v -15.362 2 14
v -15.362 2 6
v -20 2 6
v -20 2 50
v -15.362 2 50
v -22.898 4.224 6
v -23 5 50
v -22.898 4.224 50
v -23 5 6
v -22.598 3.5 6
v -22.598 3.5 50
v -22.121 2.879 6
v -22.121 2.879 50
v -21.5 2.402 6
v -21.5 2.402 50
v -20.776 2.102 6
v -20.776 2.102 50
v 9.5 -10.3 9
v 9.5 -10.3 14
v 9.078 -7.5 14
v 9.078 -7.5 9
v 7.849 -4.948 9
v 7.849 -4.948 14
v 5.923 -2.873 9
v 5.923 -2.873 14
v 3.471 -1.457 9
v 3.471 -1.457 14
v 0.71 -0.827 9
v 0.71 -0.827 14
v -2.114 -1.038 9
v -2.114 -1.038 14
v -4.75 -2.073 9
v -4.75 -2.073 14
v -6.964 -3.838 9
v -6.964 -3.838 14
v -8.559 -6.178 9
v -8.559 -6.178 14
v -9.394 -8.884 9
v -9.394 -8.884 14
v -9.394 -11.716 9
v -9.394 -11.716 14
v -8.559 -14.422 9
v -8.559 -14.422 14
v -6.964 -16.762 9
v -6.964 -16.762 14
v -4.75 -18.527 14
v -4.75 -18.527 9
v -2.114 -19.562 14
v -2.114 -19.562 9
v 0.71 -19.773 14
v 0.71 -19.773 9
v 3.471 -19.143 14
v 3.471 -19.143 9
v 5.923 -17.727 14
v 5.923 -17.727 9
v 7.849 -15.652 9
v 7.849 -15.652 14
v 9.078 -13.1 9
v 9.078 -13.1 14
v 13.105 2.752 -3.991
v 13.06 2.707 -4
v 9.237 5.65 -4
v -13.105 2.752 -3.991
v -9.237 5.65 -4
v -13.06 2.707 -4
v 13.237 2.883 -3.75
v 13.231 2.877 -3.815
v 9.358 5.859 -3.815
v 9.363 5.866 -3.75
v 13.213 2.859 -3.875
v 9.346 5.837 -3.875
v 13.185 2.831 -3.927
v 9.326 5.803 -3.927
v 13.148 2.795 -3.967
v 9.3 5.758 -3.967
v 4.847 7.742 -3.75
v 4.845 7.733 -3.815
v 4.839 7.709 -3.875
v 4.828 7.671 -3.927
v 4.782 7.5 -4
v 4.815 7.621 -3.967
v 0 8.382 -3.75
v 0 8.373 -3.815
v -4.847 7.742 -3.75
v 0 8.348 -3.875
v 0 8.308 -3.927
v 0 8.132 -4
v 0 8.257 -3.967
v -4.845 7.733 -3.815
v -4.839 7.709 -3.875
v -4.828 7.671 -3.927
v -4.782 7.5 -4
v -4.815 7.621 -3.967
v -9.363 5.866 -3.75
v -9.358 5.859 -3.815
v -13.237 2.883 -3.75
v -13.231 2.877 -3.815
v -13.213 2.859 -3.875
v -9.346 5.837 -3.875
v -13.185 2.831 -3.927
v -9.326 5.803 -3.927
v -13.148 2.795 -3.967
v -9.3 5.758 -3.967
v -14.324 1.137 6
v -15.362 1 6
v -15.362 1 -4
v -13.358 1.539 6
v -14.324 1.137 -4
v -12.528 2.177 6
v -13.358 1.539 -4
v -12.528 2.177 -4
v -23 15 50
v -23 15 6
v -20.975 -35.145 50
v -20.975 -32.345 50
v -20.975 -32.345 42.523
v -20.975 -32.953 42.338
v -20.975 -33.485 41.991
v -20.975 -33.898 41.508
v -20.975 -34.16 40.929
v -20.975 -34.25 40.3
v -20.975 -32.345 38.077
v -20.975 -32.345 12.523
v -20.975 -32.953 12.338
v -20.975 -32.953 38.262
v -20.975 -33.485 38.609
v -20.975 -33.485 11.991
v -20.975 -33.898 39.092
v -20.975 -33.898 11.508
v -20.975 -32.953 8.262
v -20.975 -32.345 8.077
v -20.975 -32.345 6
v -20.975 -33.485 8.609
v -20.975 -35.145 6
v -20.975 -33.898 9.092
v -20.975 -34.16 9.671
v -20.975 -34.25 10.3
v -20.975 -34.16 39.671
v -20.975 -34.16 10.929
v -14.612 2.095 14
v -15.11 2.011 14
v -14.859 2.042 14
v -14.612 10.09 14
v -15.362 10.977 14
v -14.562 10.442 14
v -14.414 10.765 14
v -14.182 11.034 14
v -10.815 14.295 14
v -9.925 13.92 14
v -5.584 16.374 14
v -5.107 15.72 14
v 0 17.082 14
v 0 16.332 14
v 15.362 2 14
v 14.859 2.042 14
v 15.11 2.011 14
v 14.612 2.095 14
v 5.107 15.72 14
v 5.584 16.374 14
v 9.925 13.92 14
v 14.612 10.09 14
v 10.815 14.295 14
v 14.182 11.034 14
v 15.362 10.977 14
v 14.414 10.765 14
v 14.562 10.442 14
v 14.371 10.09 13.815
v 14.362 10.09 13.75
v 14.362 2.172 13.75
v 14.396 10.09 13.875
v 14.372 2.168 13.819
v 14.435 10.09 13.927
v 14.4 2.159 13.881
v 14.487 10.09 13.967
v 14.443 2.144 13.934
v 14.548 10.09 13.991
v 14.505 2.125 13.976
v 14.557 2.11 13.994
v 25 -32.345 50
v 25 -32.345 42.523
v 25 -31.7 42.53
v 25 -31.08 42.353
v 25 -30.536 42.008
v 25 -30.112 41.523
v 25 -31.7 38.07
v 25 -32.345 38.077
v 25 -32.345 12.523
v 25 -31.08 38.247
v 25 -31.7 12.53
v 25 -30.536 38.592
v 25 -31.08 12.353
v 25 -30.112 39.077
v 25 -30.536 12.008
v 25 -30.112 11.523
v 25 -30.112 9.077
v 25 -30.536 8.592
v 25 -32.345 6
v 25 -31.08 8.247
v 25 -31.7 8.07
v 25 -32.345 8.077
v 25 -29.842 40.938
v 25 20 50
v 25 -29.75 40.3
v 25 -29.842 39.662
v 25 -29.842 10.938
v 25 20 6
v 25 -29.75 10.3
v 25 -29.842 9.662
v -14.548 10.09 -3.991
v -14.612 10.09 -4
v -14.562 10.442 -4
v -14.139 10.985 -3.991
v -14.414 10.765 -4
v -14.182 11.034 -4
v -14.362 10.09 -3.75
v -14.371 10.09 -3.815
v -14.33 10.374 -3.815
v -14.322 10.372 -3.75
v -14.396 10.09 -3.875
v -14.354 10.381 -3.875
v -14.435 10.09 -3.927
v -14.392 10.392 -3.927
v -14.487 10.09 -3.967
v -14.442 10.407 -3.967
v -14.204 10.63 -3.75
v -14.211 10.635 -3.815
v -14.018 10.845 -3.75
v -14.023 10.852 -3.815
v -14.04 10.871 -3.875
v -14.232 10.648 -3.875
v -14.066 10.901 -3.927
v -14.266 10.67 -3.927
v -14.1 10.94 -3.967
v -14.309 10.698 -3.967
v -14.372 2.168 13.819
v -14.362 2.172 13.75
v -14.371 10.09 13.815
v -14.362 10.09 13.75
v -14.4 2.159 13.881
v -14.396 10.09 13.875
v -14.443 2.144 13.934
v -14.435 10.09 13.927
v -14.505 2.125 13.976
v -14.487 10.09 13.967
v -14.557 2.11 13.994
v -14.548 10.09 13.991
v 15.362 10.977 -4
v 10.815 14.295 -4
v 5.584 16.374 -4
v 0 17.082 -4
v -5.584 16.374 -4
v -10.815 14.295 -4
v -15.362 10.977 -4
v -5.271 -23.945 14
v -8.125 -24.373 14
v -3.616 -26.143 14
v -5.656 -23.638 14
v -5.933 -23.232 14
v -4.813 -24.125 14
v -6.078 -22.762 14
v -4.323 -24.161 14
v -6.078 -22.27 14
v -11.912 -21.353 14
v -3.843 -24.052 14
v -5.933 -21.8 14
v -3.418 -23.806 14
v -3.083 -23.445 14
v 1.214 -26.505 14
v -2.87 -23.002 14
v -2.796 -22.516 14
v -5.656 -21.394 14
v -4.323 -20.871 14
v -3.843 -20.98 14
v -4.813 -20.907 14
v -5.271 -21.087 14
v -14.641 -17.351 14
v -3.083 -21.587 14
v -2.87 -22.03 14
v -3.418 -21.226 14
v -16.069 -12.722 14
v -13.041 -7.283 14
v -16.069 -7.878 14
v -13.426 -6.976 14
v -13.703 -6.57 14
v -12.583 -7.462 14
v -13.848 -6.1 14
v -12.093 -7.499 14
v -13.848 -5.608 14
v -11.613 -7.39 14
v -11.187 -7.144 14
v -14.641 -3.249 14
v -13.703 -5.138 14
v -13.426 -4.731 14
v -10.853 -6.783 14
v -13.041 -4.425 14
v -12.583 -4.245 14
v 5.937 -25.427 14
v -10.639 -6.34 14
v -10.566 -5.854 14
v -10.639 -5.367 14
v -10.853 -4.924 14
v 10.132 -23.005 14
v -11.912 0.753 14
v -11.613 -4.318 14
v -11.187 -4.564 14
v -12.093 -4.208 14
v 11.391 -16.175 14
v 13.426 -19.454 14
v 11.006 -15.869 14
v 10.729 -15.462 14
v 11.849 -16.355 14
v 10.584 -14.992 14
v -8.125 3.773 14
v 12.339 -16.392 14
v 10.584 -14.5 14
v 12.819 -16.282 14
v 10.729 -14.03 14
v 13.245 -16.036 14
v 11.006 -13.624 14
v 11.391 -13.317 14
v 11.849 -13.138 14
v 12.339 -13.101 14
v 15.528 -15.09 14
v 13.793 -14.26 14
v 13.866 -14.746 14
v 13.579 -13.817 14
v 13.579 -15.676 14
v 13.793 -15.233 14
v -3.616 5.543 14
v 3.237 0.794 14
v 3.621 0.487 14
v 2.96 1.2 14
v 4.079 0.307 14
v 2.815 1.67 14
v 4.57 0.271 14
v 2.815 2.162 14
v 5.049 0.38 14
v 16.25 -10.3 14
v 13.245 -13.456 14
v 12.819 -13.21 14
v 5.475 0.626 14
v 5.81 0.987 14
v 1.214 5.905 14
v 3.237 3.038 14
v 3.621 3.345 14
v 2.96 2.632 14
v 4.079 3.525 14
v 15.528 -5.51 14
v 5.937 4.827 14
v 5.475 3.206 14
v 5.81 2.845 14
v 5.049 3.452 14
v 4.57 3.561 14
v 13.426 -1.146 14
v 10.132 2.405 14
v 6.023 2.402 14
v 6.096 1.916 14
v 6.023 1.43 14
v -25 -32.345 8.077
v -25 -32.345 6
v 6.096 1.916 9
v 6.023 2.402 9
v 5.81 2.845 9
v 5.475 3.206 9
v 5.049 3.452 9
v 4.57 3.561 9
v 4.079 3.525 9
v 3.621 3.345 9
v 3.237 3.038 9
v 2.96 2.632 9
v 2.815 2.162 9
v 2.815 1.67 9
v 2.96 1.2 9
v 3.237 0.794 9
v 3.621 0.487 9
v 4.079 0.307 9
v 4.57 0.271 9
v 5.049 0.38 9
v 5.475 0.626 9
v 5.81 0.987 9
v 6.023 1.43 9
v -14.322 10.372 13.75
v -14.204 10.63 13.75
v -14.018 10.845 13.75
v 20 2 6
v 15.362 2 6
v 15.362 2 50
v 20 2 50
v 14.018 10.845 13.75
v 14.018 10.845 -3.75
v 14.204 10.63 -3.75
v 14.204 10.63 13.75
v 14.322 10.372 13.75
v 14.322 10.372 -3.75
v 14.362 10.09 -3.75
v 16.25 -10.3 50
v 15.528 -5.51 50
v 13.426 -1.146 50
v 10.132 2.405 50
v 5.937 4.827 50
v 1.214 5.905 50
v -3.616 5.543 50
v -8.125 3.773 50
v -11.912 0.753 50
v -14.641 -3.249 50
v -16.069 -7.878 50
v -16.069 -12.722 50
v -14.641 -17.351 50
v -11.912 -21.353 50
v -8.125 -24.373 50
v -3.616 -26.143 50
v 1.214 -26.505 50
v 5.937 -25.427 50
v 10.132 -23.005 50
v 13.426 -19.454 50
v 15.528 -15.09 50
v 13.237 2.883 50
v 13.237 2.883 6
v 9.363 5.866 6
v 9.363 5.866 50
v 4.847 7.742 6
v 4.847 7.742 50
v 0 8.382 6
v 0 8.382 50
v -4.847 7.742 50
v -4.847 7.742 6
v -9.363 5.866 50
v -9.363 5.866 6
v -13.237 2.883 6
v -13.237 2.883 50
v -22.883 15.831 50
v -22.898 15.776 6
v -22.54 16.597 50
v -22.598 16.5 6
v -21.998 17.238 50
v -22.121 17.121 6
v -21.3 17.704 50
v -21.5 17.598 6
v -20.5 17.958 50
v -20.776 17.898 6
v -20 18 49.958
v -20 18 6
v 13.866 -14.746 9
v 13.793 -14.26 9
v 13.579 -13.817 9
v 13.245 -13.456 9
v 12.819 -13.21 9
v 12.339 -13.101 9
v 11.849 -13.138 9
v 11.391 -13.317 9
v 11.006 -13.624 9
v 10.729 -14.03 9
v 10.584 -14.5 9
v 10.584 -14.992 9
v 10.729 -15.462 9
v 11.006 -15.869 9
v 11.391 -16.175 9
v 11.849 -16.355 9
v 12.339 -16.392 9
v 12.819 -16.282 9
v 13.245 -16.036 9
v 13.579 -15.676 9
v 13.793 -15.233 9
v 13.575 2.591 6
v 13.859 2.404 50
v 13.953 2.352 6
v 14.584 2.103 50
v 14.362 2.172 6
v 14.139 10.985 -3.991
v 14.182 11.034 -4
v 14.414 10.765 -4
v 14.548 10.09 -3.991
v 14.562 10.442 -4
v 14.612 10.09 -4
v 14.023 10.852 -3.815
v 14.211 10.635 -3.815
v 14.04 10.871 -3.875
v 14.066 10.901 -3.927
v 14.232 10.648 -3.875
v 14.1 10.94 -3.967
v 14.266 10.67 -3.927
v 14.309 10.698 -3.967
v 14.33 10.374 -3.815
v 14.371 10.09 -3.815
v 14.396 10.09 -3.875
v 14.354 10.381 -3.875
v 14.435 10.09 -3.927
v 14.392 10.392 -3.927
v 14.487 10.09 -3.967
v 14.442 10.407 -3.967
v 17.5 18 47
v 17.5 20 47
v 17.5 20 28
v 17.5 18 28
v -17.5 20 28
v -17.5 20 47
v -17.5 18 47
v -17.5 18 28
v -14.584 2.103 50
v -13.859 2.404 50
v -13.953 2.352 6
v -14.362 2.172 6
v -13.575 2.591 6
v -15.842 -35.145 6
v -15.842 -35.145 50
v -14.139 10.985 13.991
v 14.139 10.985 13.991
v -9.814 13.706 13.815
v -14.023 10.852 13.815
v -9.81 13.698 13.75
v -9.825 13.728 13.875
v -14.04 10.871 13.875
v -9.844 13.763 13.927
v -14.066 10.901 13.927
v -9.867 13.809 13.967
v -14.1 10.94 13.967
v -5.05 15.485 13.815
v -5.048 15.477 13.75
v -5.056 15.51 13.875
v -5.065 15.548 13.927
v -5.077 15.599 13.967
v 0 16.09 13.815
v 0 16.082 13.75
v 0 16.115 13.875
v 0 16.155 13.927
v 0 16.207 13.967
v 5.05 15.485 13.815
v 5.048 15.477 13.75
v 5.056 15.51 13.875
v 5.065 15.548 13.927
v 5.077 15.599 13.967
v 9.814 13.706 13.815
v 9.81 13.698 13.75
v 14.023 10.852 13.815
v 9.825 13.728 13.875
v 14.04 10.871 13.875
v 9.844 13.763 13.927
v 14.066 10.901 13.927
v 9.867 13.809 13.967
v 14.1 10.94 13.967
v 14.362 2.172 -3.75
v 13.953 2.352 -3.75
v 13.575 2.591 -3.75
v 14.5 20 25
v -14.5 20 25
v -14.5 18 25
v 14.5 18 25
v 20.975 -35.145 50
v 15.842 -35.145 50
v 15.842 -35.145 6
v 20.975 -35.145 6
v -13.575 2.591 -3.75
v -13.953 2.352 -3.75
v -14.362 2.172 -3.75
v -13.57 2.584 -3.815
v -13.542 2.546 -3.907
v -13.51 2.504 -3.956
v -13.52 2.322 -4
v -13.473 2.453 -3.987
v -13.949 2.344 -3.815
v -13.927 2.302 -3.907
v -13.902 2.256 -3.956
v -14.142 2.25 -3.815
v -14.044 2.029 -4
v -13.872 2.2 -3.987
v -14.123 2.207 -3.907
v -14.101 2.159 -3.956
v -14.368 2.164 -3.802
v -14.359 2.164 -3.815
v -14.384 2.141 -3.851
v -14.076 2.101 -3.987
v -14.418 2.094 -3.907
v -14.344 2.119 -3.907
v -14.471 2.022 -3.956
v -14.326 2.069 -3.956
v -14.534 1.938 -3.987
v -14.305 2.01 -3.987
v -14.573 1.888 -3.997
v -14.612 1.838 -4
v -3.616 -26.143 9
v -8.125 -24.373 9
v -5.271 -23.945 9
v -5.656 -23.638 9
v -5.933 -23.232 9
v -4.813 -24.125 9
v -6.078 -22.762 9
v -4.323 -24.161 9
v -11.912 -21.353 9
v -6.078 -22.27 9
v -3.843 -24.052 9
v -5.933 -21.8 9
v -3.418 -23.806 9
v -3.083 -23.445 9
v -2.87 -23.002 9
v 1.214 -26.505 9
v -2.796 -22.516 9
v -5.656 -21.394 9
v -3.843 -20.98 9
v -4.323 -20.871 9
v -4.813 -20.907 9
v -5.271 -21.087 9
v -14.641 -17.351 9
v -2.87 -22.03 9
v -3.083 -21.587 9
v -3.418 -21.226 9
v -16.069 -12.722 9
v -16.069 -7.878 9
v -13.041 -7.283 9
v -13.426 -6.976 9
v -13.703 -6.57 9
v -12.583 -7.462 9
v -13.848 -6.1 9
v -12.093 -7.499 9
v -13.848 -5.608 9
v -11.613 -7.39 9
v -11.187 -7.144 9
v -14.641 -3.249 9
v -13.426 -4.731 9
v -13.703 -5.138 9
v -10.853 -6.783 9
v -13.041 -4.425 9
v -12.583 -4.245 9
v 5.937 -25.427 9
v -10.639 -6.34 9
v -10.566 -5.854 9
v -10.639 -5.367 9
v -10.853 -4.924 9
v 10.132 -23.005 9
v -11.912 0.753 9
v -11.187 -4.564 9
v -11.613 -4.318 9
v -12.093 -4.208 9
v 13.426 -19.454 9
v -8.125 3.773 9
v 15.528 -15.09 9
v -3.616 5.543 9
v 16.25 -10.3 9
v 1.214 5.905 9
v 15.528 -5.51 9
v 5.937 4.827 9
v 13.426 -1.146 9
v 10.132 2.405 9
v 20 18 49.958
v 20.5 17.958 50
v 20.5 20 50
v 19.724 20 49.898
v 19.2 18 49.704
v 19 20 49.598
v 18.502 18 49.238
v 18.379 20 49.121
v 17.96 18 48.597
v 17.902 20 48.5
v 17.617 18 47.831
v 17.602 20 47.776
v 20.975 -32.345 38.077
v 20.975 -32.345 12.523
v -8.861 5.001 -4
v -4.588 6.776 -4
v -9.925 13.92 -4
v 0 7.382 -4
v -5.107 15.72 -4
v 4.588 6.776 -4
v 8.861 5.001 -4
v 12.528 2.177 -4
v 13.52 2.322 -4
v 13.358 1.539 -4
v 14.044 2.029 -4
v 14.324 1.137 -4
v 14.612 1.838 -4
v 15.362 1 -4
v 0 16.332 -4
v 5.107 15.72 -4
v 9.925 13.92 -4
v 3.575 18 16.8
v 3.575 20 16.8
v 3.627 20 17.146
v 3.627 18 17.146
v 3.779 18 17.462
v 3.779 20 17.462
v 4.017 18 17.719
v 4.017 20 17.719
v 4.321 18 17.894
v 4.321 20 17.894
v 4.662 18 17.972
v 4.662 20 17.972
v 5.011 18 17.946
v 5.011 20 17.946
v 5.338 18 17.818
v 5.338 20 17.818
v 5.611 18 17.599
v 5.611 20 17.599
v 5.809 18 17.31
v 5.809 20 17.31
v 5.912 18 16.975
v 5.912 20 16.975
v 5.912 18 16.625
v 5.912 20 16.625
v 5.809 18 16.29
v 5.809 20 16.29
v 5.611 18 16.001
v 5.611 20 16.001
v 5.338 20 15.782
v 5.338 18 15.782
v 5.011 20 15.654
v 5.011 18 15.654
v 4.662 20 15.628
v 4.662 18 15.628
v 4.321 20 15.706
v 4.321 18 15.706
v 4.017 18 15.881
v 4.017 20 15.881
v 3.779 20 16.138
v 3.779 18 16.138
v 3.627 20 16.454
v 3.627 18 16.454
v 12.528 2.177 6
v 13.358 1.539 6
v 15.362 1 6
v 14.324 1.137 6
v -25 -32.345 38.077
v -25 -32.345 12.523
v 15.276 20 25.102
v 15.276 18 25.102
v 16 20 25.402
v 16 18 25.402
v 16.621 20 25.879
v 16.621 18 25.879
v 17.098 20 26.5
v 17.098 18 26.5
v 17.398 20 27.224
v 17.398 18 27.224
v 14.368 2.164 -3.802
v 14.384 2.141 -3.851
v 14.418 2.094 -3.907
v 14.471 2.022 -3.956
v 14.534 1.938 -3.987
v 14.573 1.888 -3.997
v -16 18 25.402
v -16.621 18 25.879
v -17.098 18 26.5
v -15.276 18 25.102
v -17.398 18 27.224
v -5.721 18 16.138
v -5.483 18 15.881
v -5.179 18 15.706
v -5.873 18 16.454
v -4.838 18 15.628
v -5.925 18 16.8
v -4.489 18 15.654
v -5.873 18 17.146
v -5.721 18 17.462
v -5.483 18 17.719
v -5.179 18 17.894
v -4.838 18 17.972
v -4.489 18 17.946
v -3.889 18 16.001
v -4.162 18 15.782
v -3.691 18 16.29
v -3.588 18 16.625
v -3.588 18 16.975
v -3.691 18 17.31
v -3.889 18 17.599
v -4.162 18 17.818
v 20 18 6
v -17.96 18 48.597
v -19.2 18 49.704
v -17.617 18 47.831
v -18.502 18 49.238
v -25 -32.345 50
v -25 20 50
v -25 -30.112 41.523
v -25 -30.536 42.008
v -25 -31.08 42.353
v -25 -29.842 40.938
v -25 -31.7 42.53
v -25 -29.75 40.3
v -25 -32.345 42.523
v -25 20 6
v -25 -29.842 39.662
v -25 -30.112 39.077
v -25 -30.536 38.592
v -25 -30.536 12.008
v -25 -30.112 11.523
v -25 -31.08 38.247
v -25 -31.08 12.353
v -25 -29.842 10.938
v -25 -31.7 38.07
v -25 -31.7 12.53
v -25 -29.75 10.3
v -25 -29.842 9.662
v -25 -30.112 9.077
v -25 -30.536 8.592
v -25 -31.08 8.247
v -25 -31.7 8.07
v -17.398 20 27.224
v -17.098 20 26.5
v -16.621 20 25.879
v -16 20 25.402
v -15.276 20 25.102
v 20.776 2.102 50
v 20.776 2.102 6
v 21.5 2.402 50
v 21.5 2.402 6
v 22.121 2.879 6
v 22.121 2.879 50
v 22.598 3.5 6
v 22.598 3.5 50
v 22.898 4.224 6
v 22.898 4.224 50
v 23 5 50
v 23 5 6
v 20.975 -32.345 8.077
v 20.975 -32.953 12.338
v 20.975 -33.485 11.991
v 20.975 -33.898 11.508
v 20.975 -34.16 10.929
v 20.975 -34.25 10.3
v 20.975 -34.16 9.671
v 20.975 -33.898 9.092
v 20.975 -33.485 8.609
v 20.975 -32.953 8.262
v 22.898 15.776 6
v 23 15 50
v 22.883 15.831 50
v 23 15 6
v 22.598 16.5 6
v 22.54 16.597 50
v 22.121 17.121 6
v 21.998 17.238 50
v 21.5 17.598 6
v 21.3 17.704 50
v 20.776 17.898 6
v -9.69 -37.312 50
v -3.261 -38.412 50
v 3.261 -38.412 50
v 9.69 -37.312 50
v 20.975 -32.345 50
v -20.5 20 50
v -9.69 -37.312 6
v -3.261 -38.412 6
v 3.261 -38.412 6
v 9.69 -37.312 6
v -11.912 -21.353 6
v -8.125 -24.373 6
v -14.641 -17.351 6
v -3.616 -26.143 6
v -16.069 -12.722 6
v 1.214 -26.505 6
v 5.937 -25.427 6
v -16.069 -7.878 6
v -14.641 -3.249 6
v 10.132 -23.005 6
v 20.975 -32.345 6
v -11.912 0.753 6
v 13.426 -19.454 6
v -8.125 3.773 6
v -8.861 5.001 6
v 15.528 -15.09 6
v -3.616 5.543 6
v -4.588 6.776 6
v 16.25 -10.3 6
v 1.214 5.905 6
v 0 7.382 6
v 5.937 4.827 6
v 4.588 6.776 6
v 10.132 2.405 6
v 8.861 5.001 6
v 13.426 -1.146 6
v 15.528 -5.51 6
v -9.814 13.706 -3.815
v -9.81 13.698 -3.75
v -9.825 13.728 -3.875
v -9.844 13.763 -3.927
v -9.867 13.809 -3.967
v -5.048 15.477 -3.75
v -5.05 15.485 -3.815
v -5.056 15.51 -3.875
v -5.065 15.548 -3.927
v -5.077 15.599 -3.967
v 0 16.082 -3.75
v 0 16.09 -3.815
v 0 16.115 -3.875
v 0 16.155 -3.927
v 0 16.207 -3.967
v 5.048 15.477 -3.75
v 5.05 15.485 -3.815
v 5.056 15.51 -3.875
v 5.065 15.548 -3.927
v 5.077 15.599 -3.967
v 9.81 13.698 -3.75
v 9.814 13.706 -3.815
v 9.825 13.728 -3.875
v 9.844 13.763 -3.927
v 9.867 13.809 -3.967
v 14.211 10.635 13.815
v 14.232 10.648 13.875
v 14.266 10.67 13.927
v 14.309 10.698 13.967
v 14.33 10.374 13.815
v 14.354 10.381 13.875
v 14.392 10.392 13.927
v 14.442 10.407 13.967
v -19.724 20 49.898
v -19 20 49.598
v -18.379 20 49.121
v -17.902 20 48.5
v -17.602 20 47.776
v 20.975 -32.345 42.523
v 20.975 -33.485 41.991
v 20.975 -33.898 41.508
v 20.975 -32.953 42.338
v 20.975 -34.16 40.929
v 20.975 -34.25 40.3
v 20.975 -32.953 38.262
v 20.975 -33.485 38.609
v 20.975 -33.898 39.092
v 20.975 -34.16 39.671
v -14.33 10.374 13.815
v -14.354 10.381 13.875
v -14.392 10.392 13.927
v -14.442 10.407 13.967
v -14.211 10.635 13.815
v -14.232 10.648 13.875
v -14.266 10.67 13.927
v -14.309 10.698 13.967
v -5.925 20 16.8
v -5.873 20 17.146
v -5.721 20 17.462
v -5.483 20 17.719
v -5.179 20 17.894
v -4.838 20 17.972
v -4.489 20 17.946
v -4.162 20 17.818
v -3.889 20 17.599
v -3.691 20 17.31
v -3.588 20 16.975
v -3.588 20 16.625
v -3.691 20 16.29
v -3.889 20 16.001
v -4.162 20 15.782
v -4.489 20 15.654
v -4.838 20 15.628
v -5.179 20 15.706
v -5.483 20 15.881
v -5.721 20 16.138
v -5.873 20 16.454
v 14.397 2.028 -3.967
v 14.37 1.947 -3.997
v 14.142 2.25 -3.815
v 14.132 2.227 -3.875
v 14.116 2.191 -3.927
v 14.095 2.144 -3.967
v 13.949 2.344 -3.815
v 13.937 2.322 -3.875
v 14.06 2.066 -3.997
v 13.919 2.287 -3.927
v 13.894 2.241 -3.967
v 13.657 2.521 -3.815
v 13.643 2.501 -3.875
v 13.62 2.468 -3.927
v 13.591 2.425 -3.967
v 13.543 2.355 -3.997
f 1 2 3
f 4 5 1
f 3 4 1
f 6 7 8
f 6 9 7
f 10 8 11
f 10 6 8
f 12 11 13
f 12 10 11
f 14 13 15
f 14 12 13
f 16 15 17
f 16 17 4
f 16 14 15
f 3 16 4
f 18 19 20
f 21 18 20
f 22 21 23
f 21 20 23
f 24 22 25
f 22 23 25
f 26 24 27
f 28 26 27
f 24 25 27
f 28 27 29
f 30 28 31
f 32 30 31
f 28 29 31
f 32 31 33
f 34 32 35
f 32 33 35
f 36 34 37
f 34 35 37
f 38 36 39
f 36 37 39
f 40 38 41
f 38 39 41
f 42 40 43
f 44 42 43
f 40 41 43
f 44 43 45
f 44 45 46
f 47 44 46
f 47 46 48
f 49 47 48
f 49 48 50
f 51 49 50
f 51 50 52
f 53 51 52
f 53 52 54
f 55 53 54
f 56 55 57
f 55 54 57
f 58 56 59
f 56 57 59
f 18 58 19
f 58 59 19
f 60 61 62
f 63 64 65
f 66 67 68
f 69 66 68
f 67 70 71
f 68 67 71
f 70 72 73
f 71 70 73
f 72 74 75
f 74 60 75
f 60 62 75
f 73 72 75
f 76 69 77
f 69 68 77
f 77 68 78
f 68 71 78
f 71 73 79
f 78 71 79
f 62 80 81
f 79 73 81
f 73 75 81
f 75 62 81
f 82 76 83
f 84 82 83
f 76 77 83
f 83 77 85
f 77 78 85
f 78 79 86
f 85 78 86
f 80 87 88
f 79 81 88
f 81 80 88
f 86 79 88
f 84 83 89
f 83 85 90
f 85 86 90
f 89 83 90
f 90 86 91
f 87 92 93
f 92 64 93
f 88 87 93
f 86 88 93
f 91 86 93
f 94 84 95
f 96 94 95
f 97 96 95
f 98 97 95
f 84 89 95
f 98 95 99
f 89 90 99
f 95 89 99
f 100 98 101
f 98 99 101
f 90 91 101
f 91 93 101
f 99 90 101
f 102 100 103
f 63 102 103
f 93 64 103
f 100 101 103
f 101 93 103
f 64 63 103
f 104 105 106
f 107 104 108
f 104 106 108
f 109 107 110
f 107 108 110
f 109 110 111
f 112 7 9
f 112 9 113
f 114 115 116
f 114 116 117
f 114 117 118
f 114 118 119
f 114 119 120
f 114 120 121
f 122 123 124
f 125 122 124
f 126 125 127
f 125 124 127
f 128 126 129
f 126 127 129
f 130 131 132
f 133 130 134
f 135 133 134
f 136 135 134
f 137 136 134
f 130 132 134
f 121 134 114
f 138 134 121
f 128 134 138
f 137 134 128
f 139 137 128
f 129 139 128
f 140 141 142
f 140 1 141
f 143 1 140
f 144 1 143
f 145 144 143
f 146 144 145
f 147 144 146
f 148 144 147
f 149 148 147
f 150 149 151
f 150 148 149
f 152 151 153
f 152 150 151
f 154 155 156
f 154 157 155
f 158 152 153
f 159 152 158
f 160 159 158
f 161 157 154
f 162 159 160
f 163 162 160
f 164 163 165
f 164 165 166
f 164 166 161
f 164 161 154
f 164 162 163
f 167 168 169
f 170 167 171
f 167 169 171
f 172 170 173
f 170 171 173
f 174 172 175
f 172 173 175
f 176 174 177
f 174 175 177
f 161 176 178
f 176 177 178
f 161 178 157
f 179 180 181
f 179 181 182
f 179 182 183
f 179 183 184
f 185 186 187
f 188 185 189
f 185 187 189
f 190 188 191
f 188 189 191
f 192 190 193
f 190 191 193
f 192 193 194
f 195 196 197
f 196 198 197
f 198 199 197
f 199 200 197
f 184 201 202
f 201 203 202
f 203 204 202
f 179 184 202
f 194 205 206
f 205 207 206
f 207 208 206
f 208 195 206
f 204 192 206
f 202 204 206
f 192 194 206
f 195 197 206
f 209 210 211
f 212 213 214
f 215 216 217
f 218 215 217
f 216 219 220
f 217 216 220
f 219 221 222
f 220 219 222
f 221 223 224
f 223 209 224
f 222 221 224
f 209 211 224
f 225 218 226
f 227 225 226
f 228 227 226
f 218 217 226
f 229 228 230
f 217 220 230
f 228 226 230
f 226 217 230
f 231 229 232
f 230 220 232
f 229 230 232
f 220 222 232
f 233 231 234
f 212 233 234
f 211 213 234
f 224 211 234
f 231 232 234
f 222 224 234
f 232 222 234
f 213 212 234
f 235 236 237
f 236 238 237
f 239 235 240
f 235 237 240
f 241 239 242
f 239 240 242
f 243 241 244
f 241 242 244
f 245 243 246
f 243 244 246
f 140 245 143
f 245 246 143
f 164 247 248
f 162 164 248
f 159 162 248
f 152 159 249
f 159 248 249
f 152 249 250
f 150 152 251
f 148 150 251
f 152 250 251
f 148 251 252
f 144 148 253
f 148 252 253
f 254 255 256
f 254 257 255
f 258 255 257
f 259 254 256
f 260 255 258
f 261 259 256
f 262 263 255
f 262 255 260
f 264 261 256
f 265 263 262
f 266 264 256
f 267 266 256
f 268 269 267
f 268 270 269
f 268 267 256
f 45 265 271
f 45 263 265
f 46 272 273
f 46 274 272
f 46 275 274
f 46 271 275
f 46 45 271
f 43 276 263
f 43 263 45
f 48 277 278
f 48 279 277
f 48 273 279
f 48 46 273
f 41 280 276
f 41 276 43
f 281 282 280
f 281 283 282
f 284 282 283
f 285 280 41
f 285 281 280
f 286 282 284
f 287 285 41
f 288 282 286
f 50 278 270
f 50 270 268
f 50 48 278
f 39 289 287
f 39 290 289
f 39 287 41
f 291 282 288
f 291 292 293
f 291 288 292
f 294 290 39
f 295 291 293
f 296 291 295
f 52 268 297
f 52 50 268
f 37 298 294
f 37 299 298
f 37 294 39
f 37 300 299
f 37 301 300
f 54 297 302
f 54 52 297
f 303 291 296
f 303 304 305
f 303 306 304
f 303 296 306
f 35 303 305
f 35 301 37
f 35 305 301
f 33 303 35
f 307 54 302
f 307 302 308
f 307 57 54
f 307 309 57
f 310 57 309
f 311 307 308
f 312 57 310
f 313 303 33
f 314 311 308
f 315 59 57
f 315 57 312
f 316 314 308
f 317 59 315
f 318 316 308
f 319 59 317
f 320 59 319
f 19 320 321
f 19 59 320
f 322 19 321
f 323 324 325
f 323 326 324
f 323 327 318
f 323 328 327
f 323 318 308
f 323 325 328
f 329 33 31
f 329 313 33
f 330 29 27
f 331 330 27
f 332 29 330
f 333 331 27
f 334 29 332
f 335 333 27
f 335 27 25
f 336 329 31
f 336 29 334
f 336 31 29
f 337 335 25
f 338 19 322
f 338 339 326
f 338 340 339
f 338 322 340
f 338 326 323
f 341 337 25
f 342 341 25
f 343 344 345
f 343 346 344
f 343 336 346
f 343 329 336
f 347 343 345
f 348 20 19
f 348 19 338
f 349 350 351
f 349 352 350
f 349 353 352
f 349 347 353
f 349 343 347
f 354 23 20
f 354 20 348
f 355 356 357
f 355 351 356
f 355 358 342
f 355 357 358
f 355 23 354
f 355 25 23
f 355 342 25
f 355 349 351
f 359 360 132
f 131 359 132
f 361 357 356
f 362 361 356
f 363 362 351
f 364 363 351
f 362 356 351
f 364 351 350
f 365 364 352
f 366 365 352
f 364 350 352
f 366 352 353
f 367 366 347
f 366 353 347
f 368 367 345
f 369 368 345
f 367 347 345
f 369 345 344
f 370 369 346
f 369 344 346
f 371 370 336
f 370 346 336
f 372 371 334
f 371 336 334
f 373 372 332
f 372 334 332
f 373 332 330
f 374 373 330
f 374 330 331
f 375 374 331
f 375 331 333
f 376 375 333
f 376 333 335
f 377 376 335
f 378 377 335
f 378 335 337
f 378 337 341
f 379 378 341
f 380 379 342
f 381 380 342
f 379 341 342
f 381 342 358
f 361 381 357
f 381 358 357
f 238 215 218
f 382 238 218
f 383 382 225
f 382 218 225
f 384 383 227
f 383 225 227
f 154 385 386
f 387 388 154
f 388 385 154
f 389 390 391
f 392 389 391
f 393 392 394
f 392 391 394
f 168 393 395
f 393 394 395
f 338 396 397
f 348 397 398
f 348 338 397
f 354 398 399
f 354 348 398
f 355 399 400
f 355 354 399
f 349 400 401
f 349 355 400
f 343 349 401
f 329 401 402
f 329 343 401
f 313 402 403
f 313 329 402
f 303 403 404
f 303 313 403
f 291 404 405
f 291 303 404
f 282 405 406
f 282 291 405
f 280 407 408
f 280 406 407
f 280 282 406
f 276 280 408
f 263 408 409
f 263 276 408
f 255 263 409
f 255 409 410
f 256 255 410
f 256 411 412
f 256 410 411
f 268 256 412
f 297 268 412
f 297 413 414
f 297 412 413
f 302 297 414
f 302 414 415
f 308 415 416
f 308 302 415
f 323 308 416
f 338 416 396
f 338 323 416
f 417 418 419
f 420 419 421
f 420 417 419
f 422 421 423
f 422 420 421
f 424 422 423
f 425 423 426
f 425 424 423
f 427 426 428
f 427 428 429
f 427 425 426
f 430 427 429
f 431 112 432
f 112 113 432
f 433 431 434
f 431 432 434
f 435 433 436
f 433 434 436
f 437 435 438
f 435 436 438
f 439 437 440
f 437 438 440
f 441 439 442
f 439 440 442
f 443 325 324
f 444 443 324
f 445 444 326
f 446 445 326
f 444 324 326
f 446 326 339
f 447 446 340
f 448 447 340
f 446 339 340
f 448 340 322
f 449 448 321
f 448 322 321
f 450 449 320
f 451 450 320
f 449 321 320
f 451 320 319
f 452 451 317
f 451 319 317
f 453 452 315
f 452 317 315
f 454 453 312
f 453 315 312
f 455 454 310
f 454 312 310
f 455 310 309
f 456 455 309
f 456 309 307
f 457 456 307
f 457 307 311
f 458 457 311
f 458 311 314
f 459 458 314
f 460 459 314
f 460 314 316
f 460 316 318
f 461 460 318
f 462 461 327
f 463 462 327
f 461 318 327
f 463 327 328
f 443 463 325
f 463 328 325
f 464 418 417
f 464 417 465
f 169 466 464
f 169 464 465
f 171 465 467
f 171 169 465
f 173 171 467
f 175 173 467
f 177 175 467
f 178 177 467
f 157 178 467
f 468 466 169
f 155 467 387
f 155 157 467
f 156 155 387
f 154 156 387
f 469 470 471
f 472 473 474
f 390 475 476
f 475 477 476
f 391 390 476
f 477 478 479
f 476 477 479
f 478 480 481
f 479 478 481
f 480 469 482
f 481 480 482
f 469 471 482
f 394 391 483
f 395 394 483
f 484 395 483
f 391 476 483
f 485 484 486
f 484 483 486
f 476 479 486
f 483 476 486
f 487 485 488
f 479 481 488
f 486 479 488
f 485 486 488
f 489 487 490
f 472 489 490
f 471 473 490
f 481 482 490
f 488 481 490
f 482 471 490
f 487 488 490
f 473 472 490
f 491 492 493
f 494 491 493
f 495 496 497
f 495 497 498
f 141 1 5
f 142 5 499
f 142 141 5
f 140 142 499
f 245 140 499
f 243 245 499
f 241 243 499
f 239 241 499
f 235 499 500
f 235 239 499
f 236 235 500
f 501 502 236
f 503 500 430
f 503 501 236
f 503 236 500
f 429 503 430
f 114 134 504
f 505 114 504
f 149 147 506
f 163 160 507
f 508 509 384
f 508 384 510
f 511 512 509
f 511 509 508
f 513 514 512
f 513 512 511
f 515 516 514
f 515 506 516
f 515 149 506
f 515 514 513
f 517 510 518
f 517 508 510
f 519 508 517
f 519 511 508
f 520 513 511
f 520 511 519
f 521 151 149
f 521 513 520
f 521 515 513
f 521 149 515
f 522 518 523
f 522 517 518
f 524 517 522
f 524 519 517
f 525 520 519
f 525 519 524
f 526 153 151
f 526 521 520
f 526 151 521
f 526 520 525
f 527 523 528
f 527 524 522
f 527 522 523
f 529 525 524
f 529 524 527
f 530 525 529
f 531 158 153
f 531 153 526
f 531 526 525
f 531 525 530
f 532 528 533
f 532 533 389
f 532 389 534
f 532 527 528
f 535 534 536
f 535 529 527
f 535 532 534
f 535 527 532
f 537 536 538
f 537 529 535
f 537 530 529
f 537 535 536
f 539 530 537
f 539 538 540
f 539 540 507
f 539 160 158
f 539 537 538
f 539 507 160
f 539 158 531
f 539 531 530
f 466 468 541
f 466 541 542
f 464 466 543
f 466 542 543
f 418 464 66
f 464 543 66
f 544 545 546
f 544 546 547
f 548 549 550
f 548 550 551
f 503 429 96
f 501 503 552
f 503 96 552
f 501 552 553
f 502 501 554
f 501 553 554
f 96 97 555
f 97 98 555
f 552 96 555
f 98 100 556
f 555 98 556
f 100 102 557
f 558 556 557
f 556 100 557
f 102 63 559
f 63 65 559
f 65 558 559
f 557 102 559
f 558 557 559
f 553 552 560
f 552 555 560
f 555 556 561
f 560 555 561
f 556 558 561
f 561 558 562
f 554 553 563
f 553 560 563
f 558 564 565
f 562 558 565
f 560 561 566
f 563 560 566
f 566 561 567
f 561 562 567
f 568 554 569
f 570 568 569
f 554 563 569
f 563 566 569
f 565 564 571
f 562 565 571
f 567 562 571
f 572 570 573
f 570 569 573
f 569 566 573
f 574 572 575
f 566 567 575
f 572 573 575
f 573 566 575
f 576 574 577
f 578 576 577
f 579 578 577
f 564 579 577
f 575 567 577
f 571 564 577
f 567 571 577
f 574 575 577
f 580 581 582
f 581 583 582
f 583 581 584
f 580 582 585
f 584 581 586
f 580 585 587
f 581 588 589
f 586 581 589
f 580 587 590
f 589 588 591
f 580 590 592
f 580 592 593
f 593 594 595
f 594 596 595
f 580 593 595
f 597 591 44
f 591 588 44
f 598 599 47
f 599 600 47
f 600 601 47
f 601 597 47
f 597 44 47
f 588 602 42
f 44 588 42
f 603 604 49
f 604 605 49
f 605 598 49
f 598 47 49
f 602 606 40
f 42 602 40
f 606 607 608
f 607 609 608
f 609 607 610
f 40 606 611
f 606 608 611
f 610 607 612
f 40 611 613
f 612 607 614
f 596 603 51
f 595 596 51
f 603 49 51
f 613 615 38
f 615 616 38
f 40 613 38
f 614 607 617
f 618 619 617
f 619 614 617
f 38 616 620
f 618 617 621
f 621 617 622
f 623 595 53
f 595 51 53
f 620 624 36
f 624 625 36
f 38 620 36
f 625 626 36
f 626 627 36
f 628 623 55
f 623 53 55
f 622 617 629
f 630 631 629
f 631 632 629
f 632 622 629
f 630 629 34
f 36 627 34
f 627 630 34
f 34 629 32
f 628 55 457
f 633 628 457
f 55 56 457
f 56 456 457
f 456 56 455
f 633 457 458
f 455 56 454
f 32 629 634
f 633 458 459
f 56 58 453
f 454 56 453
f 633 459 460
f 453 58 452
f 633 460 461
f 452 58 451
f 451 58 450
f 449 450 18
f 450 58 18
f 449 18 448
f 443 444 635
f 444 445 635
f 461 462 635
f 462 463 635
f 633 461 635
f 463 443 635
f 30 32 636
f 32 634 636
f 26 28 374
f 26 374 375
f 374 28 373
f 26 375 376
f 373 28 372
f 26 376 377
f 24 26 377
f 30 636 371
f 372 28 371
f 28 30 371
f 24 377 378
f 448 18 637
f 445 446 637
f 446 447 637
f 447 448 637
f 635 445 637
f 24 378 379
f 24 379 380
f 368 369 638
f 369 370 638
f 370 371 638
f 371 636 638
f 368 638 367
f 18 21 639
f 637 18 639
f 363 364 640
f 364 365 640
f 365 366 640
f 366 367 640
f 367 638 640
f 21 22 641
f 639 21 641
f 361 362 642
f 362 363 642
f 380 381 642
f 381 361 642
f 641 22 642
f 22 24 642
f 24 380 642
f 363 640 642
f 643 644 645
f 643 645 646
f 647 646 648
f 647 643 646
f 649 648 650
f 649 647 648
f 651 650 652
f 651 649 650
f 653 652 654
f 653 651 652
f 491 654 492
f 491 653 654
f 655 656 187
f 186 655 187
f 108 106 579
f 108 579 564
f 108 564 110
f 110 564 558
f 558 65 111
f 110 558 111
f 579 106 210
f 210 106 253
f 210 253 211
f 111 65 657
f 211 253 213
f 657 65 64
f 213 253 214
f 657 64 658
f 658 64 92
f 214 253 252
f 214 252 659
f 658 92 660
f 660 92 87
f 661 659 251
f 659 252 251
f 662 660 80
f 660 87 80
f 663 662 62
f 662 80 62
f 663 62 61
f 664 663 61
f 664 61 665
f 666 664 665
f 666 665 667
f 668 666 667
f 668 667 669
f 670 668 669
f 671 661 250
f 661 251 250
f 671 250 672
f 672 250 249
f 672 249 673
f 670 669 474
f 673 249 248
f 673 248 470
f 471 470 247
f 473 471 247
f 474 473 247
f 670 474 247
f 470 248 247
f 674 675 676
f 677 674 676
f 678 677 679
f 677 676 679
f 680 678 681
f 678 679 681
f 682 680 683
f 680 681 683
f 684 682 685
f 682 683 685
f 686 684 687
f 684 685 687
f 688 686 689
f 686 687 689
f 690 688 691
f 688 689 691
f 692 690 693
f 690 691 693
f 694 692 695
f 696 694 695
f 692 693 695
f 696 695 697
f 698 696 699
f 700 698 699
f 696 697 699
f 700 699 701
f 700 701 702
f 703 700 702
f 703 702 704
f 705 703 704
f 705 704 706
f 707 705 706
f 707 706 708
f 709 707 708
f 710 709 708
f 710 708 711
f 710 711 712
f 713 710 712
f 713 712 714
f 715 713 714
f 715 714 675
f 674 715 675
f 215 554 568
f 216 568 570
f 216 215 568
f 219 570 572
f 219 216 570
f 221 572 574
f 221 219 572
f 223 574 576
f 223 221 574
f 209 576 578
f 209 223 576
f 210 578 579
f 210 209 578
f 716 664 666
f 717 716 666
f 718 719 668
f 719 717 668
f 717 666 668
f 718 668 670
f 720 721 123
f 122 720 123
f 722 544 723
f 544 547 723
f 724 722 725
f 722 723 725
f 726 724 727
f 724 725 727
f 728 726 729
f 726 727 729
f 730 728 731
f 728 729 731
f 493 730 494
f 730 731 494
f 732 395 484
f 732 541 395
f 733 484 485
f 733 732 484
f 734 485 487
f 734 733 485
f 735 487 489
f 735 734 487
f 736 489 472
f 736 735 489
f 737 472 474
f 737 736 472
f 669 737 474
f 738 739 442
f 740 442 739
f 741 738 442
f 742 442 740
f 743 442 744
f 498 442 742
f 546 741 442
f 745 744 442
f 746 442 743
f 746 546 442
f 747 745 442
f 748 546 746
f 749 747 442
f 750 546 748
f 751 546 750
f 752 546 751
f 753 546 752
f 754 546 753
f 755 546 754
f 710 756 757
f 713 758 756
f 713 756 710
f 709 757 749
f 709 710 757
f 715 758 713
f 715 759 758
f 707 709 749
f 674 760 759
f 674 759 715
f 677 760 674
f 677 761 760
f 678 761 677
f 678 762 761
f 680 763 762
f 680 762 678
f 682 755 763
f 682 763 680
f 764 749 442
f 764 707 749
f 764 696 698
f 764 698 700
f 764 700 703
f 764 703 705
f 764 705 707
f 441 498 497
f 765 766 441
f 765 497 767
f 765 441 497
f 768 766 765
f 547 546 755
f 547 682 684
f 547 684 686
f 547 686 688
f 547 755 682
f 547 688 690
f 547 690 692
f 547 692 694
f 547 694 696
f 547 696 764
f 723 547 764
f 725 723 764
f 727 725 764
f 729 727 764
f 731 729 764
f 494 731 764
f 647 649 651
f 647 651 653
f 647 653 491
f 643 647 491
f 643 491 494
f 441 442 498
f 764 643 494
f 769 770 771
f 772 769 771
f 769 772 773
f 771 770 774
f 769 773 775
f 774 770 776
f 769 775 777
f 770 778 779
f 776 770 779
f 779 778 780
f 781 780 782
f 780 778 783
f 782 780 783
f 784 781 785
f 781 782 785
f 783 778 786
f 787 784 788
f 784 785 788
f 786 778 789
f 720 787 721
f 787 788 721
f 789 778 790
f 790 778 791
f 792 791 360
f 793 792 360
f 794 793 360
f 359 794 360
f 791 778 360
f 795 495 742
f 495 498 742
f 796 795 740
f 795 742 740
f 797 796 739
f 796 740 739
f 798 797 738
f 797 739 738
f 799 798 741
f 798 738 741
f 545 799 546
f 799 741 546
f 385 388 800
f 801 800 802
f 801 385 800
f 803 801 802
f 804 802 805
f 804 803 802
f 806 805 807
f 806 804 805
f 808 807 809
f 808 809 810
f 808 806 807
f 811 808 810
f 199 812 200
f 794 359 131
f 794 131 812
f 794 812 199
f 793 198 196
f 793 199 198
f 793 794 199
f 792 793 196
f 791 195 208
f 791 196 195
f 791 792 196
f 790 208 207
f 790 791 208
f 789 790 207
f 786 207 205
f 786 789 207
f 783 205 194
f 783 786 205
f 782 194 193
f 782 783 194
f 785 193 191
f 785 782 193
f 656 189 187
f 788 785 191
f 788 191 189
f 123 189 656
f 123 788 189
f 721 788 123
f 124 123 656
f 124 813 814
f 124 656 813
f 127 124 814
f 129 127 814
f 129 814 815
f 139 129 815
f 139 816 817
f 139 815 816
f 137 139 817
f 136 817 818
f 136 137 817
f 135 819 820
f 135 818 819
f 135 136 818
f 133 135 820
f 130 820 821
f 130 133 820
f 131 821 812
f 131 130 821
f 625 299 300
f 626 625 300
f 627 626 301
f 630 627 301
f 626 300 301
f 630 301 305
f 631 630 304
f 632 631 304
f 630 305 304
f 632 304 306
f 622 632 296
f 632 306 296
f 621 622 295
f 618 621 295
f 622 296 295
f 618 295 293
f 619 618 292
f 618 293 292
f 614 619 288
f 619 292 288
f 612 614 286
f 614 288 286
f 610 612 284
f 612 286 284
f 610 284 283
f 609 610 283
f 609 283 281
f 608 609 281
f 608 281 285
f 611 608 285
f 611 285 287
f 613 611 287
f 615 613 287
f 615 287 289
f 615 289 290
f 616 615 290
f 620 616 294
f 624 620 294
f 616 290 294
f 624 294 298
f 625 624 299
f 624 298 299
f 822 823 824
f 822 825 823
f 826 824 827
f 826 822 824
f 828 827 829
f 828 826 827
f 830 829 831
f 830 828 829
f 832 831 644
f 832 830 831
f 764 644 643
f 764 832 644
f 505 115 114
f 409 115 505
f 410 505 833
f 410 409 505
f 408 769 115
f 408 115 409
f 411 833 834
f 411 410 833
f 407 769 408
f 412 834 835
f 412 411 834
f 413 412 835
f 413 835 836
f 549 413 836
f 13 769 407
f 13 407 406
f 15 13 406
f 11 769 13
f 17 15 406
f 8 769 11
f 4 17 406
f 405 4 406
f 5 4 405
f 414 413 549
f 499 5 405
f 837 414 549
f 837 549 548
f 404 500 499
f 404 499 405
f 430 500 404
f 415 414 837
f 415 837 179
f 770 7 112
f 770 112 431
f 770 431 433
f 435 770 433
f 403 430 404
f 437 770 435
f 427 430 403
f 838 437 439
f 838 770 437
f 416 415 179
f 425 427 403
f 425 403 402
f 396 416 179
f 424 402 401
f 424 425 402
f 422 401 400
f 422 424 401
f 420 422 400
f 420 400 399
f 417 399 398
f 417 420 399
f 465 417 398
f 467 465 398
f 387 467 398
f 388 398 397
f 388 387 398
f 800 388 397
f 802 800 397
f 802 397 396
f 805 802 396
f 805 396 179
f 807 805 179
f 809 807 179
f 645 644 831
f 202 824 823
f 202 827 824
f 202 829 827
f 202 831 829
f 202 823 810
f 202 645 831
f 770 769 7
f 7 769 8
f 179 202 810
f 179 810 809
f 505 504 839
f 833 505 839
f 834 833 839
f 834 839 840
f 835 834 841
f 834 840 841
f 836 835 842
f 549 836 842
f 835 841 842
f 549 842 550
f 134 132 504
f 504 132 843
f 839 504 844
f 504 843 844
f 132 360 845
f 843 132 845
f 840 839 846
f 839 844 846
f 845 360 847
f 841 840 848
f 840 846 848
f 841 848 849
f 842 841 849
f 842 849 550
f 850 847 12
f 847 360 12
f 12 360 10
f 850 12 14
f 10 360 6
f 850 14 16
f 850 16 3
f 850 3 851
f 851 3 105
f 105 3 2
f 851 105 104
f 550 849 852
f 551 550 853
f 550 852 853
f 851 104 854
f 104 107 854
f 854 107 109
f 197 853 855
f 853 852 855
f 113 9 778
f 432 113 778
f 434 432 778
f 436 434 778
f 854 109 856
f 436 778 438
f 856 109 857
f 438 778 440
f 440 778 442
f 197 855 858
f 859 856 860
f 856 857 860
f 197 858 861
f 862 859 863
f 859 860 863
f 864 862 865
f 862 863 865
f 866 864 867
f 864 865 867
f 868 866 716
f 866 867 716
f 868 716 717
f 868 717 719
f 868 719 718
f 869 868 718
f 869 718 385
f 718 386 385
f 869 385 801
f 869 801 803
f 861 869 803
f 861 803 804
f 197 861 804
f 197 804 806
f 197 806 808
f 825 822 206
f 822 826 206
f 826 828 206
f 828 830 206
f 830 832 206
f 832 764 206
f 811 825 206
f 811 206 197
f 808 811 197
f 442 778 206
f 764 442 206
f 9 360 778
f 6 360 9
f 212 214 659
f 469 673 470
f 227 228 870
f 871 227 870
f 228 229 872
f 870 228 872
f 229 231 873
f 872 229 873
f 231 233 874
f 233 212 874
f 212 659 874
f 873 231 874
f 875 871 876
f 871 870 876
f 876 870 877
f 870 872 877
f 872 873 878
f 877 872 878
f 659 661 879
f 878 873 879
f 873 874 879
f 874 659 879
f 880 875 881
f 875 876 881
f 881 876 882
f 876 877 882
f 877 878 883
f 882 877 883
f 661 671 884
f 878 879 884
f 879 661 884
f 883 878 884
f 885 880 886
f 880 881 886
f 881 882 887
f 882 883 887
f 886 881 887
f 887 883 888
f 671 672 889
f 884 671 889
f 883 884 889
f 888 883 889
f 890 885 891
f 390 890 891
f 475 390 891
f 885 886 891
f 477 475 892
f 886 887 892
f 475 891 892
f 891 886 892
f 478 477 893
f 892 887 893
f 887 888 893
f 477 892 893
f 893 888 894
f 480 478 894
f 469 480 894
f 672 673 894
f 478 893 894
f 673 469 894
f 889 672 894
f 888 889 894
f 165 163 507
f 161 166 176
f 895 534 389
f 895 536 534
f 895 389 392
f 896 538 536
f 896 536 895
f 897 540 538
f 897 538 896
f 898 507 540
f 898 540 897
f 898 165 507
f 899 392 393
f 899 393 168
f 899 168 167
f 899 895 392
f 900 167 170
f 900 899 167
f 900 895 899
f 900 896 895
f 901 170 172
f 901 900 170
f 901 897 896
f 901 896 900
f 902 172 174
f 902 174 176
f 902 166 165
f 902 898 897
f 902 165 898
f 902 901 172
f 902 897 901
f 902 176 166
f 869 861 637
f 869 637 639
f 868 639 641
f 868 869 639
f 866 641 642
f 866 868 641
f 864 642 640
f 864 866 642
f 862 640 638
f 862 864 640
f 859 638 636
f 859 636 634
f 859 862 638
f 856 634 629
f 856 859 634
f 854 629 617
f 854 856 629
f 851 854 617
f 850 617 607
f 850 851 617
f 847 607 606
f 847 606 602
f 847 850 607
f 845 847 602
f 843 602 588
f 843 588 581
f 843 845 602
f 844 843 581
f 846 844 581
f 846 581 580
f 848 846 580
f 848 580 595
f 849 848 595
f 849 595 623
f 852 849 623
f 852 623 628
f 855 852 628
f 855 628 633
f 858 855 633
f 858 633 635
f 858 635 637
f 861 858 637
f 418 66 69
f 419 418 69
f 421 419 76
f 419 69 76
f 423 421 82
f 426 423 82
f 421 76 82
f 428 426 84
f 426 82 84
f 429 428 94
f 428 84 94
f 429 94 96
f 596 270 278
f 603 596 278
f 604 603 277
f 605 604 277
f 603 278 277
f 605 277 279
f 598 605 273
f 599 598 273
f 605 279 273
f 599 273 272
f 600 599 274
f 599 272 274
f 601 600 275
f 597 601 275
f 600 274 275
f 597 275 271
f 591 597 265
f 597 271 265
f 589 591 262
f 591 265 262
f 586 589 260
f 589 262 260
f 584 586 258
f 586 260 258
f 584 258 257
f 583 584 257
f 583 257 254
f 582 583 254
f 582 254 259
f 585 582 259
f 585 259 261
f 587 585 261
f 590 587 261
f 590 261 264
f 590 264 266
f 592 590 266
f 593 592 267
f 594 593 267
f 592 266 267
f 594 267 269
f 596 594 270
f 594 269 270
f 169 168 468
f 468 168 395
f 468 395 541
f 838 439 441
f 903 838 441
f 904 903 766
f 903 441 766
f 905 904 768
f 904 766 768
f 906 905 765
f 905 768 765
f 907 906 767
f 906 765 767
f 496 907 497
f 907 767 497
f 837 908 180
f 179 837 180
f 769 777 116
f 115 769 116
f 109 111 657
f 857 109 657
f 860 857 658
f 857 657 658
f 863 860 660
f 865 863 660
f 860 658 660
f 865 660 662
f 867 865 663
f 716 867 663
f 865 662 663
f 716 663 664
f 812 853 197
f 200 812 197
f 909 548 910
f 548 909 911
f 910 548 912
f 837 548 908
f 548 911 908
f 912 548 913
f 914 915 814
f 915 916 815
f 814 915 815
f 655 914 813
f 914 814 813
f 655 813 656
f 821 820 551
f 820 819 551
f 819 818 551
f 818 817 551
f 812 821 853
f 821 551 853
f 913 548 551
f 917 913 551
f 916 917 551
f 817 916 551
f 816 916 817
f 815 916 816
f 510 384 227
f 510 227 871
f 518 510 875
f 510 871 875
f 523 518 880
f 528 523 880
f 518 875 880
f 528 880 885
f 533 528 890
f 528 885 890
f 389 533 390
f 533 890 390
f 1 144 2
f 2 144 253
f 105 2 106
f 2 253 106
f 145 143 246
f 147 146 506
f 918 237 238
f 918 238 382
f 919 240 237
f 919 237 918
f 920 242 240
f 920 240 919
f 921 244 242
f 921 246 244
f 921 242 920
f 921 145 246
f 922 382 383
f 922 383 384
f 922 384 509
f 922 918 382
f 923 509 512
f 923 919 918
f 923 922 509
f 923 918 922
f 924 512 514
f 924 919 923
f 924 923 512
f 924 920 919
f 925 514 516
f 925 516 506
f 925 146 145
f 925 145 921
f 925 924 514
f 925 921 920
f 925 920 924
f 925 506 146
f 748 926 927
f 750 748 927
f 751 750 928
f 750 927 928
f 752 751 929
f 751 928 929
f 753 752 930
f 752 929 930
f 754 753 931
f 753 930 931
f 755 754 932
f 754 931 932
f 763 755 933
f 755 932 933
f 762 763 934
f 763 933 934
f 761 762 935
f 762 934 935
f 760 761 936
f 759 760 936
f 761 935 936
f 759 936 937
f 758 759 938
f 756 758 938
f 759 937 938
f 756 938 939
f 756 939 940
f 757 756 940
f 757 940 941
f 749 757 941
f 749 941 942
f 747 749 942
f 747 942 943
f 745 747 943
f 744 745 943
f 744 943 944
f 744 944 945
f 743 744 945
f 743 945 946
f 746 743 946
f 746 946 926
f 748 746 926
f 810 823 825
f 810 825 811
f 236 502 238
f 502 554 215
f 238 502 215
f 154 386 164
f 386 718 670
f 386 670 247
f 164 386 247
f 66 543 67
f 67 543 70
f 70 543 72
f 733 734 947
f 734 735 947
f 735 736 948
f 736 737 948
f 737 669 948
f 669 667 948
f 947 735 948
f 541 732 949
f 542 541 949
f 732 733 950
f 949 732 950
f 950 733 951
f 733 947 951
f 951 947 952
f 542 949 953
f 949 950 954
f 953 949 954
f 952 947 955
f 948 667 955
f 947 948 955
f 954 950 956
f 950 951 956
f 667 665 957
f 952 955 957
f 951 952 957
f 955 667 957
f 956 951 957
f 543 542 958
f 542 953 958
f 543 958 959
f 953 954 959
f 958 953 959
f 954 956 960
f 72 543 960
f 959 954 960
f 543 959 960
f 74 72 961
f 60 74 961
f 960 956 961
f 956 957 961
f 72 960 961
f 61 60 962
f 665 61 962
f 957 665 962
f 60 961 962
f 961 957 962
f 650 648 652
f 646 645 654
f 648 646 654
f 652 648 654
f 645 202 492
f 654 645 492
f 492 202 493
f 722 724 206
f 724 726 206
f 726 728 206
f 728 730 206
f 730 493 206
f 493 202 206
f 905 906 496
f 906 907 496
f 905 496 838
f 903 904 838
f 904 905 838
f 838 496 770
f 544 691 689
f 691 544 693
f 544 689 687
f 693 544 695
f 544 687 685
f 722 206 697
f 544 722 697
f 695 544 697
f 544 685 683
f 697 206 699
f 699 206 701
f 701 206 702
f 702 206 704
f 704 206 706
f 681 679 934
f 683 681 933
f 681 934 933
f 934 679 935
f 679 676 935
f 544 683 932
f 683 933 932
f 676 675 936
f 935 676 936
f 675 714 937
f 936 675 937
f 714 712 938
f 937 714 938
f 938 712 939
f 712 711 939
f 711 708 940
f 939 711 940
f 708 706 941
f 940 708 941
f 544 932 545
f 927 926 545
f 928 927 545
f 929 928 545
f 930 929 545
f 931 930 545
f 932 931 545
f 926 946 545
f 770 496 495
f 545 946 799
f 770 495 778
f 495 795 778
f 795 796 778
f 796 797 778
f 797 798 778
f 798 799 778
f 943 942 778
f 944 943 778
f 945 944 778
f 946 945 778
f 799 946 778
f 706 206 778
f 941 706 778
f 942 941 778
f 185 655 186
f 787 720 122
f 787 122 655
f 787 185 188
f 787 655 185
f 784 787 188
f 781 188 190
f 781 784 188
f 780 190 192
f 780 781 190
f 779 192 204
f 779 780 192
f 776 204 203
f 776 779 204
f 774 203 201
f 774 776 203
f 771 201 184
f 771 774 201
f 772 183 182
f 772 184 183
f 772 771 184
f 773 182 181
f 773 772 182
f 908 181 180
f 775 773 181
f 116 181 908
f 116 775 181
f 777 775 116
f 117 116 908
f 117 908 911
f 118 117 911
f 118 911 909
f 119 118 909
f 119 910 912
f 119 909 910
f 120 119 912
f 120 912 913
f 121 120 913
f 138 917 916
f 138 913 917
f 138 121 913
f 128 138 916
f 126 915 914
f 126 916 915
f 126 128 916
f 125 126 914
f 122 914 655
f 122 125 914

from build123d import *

# Parameters (mm, degrees)
BOSS_EXTRUDE2_START      = 6
BOSS_EXTRUDE2_DEPTH      = 44
CUT_EXTRUDE1_DEPTH       = 64.616841
CUT_EXTRUDE1_DEPTH_BACK  = 64.616841
SKETCH2_R                = 16.25
CUT_EXTRUDE3_DEPTH       = 64.616841
FILLET1_R                = 3
SKETCH5_W                = 35
SKETCH5_H                = 25
CUT_EXTRUDE4_DEPTH       = 10
FILLET2_R                = 3
SKETCH6_R                = 16.25
SKETCH6_R_2              = 9.5
SKETCH6_R_3              = 1.65
BOSS_EXTRUDE3_DEPTH      = 5
CUT_EXTRUDE5_DEPTH       = 68.905099
CUT_EXTRUDE5_DEPTH_BACK  = 68.905099
SKETCH7_R                = 2.25
CUT_EXTRUDE6_REACH       = 82.951
SKETCH8_R                = 1.175
BOSS_EXTRUDE4_DEPTH      = 8
BOSS_EXTRUDE4_DEPTH_BACK = 10
BOSS_EXTRUDE4_START      = -44
FILLET5_R                = 0.25
FILLET6_R                = 0.25


with BuildPart() as part:
    # Sketch1 → Boss-Extrude2 (new body)
    with BuildSketch(Plane.XY.offset(BOSS_EXTRUDE2_START)):
        with BuildLine():
            Line((-25, 0), (-25, -29.344548))
            Line((-25, -29.344548), (-25, -32.344548))
            Line((-25, -32.344548), (-20.974573, -32.344548))
            Line((-20.974573, -32.344548), (-20.974573, -35.144548))
            Line((-20.974573, -35.144548), (-15.841819, -35.144548))
            ThreePointArc((-15.841819, -35.144548), (0, -38.55), (15.841819, -35.144548))
            Line((15.841819, -35.144548), (20.974573, -35.144548))
            Line((20.974573, -35.144548), (20.974573, -32.344548))
            Line((20.974573, -32.344548), (25, -32.344548))
            Line((25, -32.344548), (25, -29.344548))
            Line((25, -29.344548), (25, 0))
            Line((25, 0), (25, 20))
            Line((25, 20), (-25, 20))
            Line((-25, 20), (-25, 0))
        make_face()
    extrude(amount=BOSS_EXTRUDE2_DEPTH)

    # Sketch2 → Cut-Extrude1 (cut, two sides: drawn at the far end of the back side and taken through both)
    with BuildSketch(Plane.XY.offset(50).offset(-CUT_EXTRUDE1_DEPTH_BACK)):
        with Locations((0, -10.3)):
            Circle(SKETCH2_R)
    extrude(amount=CUT_EXTRUDE1_DEPTH + CUT_EXTRUDE1_DEPTH_BACK, mode=Mode.SUBTRACT)

    # Sketch4 → Cut-Extrude3 (cut, through all)
    with BuildSketch(Plane.XY.offset(50)):
        with BuildLine():
            Line((-23, 18), (23, 18))
            Line((23, 18), (23, 2))
            Line((23, 2), (14.060939, 2))
            ThreePointArc((14.060939, 2), (0, 8.381542), (-14.060939, 2))
            Line((-14.060939, 2), (-23, 2))
            Line((-23, 2), (-23, 18))
        make_face()
    extrude(amount=-CUT_EXTRUDE3_DEPTH, mode=Mode.SUBTRACT)

    # Fillet1
    fillet1_edges = [part.edges().sort_by_distance(p)[0] for p in [
        (23, 18, 28),
        (23, 2, 28),
        (14.060939, 2, 28),
        (-14.060939, 2, 28),
        (-23, 2, 28),
        (-23, 18, 28),
    ]]
    fillet(fillet1_edges, radius=FILLET1_R)

    # Sketch5 → Cut-Extrude4 (cut)
    with BuildSketch(Plane(origin=(0, 20, 0), x_dir=(1, 0, 0), z_dir=(0, 1, 0))):
        with Locations((0, -37.5)):
            Rectangle(SKETCH5_W, SKETCH5_H)
    extrude(amount=-CUT_EXTRUDE4_DEPTH, mode=Mode.SUBTRACT)

    # Fillet2
    fillet2_edges = [part.edges().sort_by_distance(p)[0] for p in [
        (17.5, 19, 50),
        (17.5, 19, 25),
        (-17.5, 19, 25),
        (-17.5, 19, 50),
    ]]
    fillet(fillet2_edges, radius=FILLET2_R)

    # Sketch6 → Boss-Extrude3 (add)
    with BuildSketch(Plane.XY.offset(14)):
        with Locations((0, -10.3)):
            Circle(SKETCH6_R)
        with Locations((0, -10.3)):
            Circle(SKETCH6_R_2, mode=Mode.SUBTRACT)
        with Locations((4.446262, 1.916004)):
            Circle(SKETCH6_R_3, mode=Mode.SUBTRACT)
        with Locations((12.216004, -14.746262)):
            Circle(SKETCH6_R_3, mode=Mode.SUBTRACT)
        with Locations((-4.446262, -22.516004)):
            Circle(SKETCH6_R_3, mode=Mode.SUBTRACT)
        with Locations((-12.216004, -5.853738)):
            Circle(SKETCH6_R_3, mode=Mode.SUBTRACT)
    extrude(amount=-BOSS_EXTRUDE3_DEPTH)

    # Sketch7 → Cut-Extrude5 (cut, two sides: drawn at the far end of the back side and taken through both)
    with BuildSketch(Plane(origin=(0, 0, 0), x_dir=(0, 0, -1), z_dir=(1, 0, 0)).offset(-CUT_EXTRUDE5_DEPTH_BACK)):
        with Locations(Location((-40.3, -32, 0), (0, 0, 351.191499))):
            Circle(SKETCH7_R)
        with Locations(Location((-10.3, -32, 0), (0, 0, 351.191499))):
            Circle(SKETCH7_R)
    extrude(amount=CUT_EXTRUDE5_DEPTH + CUT_EXTRUDE5_DEPTH_BACK, mode=Mode.SUBTRACT)

    # Sketch8 → Cut-Extrude6 (cut, up to next)
    with BuildSketch(Plane(origin=(0, 20, 0), x_dir=(1, 0, 0), z_dir=(0, 1, 0)), mode=Mode.PRIVATE) as cut_extrude6_sk1:
        with Locations(Location((-4.75, -16.8, 0), (0, 0, 180))):
            Circle(SKETCH8_R)
    cut_extrude6_tool1 = extrude(cut_extrude6_sk1.sketch, amount=-CUT_EXTRUDE6_REACH, mode=Mode.PRIVATE) & part.part
    # Sketch8 → Cut-Extrude6 (cut, up to next)
    with BuildSketch(Plane(origin=(0, 20, 0), x_dir=(1, 0, 0), z_dir=(0, 1, 0)), mode=Mode.PRIVATE) as cut_extrude6_sk2:
        with Locations(Location((4.75, -16.8, 0), (0, 0, 180))):
            Circle(SKETCH8_R)
    cut_extrude6_tool2 = extrude(cut_extrude6_sk2.sketch, amount=-CUT_EXTRUDE6_REACH, mode=Mode.PRIVATE) & part.part
    add(cut_extrude6_tool1.solids().sort_by_distance((-4.75, 20, 16.8))[0], mode=Mode.SUBTRACT)
    add(cut_extrude6_tool2.solids().sort_by_distance((4.75, 20, 16.8))[0], mode=Mode.SUBTRACT)

    # Sketch9 → Boss-Extrude4 (add, two sides: drawn at the far end of the back side and taken through both)
    with BuildSketch(Plane.XY.offset(50).offset(BOSS_EXTRUDE4_START - BOSS_EXTRUDE4_DEPTH_BACK)):
        with BuildLine():
            Line((15.362267, 1), (15.362267, 10.976798))
            ThreePointArc((15.362267, 10.976798), (0, 17.081542), (-15.362267, 10.976798))
            Line((-15.362267, 10.976798), (-15.362267, 1))
            ThreePointArc((-15.362267, 1), (-13.827782, 1.306038), (-12.528102, 2.177322))
            ThreePointArc((-12.528102, 2.177322), (0, 7.381542), (12.528102, 2.177322))
            ThreePointArc((12.528102, 2.177322), (13.827782, 1.306038), (15.362267, 1))
        make_face()
        with BuildLine():
            ThreePointArc((-13.236643, 2.882992), (-13.759485, 2.464041), (-14.362267, 2.171573))
            Line((-14.362267, 2.171573), (-14.362267, 10.090161))
            ThreePointArc((-14.362267, 10.090161), (-14.272104, 10.505127), (-14.017873, 10.845264))
            ThreePointArc((-14.017873, 10.845264), (0, 16.081542), (14.017873, 10.845264))
            ThreePointArc((14.017873, 10.845264), (14.272104, 10.505127), (14.362267, 10.090161))
            Line((14.362267, 10.090161), (14.362267, 2.171573))
            ThreePointArc((14.362267, 2.171573), (13.759485, 2.464041), (13.236643, 2.882992))
            ThreePointArc((13.236643, 2.882992), (0, 8.381542), (-13.236643, 2.882992))
        make_face(mode=Mode.SUBTRACT)
    extrude(amount=BOSS_EXTRUDE4_DEPTH + BOSS_EXTRUDE4_DEPTH_BACK)

    # Fillet5
    fillet5_edges = [part.edges().sort_by_distance(p)[0] for p in [
        (0, 8.381542, -4),
        (14.272104, 10.505127, -4),
        (0, 16.081542, -4),
        (-14.272104, 10.505127, -4),
        (-13.759485, 2.464041, -4),
        (13.759485, 2.464041, -4),
        (14.362267, 6.130867, -4),
        (-14.362267, 6.130867, -4),
    ]]
    fillet(fillet5_edges, radius=FILLET5_R)

    # Fillet6
    fillet6_edges = [part.edges().sort_by_distance(p)[0] for p in [
        (-14.362267, 6.130867, 14),
        (0, 16.081542, 14),
        (14.272104, 10.505127, 14),
        (14.362267, 6.130867, 14),
        (-14.272104, 10.505127, 14),
    ]]
    fillet(fillet6_edges, radius=FILLET6_R)


solid = part.part
